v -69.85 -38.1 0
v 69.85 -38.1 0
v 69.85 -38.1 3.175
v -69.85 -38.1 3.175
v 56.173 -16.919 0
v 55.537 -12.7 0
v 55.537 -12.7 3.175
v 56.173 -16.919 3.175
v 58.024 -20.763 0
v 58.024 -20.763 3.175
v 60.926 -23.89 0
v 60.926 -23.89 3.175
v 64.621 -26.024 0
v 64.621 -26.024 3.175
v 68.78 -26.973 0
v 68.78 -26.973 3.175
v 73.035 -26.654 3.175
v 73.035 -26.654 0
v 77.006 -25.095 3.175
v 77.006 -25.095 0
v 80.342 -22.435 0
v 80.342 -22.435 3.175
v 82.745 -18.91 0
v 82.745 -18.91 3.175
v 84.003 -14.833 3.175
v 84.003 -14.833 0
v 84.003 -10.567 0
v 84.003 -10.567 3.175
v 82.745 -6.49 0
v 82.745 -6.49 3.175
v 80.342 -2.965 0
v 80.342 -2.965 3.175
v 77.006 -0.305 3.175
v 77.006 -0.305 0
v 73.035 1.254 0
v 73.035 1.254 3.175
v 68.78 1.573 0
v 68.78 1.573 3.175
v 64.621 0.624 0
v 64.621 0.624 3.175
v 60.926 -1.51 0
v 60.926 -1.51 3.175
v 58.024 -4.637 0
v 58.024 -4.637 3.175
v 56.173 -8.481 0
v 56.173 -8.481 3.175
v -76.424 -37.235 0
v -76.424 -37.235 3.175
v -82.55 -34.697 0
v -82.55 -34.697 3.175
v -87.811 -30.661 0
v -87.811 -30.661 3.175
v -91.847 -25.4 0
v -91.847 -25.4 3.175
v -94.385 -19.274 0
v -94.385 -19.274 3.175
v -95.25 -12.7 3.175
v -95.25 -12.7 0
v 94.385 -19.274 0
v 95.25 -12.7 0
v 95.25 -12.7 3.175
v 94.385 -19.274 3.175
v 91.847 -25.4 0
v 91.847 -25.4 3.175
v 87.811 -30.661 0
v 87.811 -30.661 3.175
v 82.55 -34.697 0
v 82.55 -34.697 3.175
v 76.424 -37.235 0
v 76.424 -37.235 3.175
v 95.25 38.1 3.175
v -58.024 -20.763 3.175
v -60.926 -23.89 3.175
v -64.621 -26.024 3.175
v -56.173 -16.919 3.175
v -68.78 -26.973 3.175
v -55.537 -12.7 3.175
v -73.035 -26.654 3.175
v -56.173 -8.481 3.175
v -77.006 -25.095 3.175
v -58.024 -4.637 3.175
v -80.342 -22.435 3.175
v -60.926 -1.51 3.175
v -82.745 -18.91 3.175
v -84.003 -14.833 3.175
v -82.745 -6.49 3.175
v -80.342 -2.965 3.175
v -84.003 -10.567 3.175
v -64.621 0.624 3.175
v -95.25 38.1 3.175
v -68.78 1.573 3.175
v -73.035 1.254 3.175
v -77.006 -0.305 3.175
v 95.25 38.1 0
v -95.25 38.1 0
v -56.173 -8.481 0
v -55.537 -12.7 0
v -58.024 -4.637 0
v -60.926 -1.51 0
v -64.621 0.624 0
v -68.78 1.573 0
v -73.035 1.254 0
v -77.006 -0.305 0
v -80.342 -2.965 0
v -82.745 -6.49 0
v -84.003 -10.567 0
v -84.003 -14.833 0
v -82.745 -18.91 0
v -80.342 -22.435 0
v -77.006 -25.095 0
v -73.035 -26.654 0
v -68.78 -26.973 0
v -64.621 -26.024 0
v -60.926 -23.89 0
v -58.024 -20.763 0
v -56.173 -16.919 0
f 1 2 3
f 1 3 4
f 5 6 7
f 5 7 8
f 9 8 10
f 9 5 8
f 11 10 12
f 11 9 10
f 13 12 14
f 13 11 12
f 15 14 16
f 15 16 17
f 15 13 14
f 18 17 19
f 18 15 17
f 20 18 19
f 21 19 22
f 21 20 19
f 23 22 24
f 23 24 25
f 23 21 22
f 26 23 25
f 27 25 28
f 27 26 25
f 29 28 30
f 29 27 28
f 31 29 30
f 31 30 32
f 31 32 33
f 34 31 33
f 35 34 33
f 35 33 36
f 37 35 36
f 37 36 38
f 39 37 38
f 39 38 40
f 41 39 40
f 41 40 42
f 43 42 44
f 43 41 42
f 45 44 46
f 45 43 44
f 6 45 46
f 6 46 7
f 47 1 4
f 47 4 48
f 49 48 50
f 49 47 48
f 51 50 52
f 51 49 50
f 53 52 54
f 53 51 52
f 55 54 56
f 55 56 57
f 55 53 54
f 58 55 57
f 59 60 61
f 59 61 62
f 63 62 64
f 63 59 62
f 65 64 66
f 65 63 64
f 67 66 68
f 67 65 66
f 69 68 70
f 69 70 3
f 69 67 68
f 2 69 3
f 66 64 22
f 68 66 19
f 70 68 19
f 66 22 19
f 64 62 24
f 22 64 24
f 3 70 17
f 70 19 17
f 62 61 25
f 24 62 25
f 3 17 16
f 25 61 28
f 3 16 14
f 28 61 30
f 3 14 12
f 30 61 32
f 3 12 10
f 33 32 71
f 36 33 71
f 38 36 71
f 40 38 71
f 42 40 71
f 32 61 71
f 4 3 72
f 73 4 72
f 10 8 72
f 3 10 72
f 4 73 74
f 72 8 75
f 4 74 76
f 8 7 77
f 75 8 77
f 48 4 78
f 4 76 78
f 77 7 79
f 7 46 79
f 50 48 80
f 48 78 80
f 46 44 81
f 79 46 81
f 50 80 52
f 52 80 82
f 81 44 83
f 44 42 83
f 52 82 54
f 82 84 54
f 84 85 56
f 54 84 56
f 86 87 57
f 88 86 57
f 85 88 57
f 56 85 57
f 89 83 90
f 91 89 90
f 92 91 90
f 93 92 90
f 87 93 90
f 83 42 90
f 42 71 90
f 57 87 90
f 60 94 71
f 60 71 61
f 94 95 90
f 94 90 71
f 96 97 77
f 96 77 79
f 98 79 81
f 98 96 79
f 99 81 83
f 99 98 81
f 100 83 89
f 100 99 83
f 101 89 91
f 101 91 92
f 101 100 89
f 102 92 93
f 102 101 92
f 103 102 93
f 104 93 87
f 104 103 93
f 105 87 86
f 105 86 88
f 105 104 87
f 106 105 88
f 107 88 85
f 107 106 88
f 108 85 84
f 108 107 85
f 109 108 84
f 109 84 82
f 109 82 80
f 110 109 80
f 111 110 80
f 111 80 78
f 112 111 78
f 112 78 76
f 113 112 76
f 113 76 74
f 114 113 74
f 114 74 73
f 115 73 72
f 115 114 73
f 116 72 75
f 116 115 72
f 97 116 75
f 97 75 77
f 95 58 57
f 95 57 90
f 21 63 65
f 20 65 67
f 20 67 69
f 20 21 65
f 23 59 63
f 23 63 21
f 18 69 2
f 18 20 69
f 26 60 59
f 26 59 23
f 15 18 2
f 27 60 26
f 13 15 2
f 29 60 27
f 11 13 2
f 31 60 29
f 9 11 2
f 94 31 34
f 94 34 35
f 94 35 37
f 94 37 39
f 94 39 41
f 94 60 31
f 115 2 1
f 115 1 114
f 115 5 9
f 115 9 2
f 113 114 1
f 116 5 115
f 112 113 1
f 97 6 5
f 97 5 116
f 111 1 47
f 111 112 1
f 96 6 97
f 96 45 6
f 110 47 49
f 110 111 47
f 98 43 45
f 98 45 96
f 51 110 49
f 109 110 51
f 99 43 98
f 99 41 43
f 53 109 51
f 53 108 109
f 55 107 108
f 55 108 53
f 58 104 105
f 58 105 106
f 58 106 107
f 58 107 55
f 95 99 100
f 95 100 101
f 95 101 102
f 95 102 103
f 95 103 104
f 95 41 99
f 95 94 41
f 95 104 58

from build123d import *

# Parameters (mm, degrees)
SKETCH1_R           = 14.3129
BOSS_EXTRUDE1_DEPTH = 3.175


with BuildPart() as part:
    # Sketch1 → Boss-Extrude1 (new body)
    with BuildSketch(Plane.XY):
        with BuildLine():
            Line((69.85, -38.1), (-69.85, -38.1))
            ThreePointArc((-69.85, -38.1), (-87.810512242, -30.660512242), (-95.25, -12.7))
            Line((-95.25, -12.7), (-95.25, 38.1))
            Line((-95.25, 38.1), (95.25, 38.1))
            Line((95.25, 38.1), (95.25, -12.7))
            ThreePointArc((95.25, -12.7), (87.810512242, -30.660512242), (69.85, -38.1))
        make_face()
        with Locations((-69.85, -12.7)):
            Circle(SKETCH1_R, mode=Mode.SUBTRACT)
        with Locations(Location((69.85, -12.7, 0), (0, 0, 180))):
            Circle(SKETCH1_R, mode=Mode.SUBTRACT)
    extrude(amount=BOSS_EXTRUDE1_DEPTH)


solid = part.part
